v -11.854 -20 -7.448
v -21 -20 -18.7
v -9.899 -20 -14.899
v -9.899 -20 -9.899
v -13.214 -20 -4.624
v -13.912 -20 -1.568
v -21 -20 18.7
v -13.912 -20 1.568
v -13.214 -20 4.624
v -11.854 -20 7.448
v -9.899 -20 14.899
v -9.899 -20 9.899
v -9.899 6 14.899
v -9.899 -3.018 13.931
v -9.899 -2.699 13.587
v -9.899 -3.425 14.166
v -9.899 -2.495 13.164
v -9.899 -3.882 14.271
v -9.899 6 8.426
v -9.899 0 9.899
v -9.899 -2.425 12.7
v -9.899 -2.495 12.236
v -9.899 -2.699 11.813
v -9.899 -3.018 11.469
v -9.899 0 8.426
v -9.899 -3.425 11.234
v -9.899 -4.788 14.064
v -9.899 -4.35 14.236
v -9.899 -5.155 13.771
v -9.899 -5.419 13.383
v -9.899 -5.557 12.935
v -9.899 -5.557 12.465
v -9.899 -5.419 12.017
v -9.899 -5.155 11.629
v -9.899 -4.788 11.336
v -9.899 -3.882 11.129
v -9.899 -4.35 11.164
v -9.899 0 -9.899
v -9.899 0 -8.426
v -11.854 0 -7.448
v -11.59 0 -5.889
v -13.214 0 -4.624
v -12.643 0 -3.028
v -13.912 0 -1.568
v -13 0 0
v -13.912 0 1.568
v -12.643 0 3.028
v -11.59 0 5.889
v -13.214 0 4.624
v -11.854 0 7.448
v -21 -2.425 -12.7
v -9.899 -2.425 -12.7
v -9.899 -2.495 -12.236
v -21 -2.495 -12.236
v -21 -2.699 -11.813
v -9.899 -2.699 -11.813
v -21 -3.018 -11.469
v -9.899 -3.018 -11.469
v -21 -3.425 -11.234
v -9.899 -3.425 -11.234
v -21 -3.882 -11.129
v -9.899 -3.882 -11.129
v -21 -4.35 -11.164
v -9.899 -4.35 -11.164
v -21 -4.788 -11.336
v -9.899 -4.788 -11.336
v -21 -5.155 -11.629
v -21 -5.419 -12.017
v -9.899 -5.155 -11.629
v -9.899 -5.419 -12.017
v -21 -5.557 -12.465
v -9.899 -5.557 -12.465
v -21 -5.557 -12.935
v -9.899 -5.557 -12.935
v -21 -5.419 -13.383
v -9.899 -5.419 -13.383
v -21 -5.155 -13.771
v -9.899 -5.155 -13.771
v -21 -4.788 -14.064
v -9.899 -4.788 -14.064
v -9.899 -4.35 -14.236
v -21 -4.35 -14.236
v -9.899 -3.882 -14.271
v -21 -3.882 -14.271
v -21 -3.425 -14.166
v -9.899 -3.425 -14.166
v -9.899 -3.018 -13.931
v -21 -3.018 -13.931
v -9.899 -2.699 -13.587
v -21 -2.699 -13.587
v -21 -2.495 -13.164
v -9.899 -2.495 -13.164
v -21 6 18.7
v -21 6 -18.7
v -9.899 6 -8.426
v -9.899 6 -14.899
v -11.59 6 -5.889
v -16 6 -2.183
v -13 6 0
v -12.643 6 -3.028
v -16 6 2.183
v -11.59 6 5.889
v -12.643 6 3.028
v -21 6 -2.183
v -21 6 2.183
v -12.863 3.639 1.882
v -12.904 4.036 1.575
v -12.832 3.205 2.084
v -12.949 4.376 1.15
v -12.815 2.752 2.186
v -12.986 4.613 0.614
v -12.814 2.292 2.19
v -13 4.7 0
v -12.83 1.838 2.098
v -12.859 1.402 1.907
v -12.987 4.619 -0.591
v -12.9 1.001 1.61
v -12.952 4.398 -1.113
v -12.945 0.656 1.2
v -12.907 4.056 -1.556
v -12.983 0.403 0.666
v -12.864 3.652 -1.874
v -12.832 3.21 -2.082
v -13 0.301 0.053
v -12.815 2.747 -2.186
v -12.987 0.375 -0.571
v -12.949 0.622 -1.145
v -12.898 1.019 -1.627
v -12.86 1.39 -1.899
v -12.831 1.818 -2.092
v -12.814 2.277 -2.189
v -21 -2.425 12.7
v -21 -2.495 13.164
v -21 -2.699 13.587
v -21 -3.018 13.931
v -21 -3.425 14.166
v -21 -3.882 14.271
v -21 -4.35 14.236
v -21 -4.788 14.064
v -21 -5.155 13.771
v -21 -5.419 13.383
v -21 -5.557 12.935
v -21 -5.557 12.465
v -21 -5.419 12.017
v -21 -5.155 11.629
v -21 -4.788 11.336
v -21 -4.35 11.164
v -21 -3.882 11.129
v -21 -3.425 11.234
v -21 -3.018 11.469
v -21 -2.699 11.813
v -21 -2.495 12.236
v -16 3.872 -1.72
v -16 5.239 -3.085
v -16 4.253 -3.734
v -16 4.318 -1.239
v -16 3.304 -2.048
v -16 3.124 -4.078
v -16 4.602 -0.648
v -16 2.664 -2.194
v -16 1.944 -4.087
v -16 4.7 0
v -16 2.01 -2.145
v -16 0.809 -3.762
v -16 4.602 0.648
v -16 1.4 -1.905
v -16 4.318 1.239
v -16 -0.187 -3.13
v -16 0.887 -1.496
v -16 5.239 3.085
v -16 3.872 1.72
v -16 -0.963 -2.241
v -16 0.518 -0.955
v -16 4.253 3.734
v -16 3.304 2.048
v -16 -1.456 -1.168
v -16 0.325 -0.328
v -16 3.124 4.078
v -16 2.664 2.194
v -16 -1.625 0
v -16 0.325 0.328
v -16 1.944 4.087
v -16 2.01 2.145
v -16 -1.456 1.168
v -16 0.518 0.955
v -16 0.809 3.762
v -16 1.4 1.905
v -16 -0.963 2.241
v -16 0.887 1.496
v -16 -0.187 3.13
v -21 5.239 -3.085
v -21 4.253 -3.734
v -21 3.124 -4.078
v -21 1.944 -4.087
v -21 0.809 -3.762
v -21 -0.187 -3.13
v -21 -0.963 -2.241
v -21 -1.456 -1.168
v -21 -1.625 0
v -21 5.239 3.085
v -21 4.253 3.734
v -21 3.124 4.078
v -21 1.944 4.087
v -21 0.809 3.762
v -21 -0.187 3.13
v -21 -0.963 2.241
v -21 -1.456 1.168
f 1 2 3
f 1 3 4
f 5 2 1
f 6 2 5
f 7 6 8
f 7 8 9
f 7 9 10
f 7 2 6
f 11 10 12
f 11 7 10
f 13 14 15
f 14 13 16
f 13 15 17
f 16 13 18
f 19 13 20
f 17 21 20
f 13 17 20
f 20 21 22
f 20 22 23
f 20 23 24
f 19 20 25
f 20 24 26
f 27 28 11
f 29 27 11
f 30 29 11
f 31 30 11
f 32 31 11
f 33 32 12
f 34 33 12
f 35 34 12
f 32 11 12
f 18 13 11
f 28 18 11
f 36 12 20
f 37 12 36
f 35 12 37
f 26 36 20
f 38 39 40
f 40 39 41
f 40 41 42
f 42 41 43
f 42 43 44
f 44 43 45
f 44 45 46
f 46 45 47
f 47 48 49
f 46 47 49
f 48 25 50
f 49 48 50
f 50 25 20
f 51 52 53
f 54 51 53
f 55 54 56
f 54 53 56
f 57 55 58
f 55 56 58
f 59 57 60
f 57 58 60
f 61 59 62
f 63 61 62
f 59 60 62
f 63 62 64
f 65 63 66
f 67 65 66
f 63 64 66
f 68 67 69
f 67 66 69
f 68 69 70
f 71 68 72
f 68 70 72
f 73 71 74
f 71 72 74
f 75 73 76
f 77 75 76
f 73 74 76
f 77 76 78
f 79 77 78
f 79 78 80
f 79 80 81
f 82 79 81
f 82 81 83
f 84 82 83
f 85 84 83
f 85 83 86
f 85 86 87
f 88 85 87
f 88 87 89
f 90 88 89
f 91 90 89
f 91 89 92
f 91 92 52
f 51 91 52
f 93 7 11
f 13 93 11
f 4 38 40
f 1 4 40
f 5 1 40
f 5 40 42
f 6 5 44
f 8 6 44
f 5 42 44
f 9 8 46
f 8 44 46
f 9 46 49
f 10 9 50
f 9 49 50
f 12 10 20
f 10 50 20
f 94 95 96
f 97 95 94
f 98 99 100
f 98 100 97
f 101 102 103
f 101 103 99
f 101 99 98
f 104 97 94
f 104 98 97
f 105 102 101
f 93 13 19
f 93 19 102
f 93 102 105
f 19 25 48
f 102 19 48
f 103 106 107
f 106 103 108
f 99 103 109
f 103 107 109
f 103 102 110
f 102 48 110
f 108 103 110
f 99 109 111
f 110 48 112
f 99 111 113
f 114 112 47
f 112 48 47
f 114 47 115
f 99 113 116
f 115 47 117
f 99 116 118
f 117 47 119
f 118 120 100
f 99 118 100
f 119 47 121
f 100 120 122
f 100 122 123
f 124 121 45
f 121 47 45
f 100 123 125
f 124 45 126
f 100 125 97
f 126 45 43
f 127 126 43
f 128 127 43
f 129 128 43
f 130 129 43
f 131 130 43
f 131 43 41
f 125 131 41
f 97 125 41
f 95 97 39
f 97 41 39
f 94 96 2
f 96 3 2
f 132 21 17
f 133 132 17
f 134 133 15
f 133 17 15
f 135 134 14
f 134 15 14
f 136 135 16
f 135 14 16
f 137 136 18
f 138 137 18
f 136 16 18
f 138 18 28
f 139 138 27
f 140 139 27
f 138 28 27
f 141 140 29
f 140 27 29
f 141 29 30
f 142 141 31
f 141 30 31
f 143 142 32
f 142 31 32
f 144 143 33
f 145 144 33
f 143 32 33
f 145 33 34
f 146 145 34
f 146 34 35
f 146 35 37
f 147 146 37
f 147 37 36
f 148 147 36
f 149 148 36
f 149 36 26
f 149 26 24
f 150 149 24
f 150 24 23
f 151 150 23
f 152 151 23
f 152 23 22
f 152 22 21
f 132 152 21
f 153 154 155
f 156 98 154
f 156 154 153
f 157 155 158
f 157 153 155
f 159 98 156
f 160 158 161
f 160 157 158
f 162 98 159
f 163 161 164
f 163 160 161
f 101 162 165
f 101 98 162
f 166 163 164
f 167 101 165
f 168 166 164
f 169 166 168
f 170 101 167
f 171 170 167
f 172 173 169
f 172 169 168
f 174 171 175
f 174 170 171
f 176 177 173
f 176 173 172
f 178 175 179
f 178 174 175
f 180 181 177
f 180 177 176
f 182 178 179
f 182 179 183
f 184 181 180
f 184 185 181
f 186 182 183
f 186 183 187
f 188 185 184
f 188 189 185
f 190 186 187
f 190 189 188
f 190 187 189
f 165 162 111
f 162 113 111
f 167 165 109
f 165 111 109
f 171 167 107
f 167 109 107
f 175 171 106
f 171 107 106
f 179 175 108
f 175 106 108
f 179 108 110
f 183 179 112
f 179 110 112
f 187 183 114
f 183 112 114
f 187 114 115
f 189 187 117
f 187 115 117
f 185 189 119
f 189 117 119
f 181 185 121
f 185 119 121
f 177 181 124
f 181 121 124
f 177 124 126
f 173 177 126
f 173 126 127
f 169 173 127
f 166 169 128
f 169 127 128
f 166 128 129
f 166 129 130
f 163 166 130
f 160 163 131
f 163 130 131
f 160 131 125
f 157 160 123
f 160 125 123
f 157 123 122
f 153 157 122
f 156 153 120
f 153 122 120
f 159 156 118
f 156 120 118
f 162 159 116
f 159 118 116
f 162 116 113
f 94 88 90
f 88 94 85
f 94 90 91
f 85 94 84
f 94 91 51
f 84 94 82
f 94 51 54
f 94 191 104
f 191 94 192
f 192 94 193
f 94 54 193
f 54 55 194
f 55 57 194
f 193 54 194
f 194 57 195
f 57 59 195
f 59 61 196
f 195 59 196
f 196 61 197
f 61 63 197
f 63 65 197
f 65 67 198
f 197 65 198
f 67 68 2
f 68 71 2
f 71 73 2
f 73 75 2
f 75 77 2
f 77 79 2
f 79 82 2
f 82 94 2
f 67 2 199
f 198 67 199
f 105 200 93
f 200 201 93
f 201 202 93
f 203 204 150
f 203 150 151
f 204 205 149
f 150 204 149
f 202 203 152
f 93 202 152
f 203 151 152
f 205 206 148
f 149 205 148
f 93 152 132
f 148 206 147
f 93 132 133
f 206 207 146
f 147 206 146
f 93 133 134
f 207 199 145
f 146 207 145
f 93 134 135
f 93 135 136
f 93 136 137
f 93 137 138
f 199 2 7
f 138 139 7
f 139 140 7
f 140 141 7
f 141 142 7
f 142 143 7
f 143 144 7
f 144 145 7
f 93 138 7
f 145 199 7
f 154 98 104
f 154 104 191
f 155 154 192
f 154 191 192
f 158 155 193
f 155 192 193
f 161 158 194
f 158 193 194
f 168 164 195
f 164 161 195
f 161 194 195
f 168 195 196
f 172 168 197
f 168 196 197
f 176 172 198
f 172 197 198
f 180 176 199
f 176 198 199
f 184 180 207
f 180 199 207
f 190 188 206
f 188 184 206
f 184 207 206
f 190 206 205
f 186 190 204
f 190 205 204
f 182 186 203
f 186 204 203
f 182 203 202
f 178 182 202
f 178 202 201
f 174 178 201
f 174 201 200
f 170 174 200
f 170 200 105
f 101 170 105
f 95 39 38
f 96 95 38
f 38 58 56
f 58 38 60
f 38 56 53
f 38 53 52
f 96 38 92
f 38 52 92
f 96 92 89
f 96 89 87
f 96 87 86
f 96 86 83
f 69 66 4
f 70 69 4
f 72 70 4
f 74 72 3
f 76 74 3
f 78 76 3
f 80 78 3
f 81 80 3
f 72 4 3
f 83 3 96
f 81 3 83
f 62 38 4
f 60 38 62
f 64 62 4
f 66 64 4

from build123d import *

# Parameters (mm, degrees)
F2_DEPTH       = 20
F4_DEPTH       = 6
F6_D           = 3.15
F7_D           = 4.4
F7_CBORE_D     = 8.25
F7_CBORE_DEPTH = 5


with BuildPart() as f2:
    # F1 (on Front) → F2 (new body)
    with BuildSketch(Plane.XZ):
        with BuildLine():
            ThreePointArc((-9.8994949366, -9.8994949366), (-14, 0), (-9.8994949366, 9.8994949366))
            Line((-9.8994949366, 9.8994949366), (-9.8994949366, 14.8994949366))
            Line((-9.8994949366, 14.8994949366), (-21, 18.7))
            Line((-21, 18.7), (-21, -18.7))
            Line((-21, -18.7), (-9.8994949366, -14.8994949366))
            Line((-9.8994949366, -14.8994949366), (-9.8994949366, -9.8994949366))
        make_face()
    extrude(amount=F2_DEPTH)

    # F3 (on face) → F4 (join)
    with BuildSketch(Plane(origin=(0, 0, 0), x_dir=(-1, 0, 0), z_dir=(0, 1, 0))):
        with BuildLine():
            Line((9.8994949366, 14.8994949366), (9.8994949366, 8.4261497732))
            ThreePointArc((9.8994949366, 8.4261497732), (13, 0), (9.8994949366, -8.4261497732))
            Line((9.8994949366, -8.4261497732), (9.8994949366, -14.8994949366))
            Line((9.8994949366, -14.8994949366), (21, -18.7))
            Line((21, -18.7), (21, 18.7))
            Line((21, 18.7), (9.8994949366, 14.8994949366))
        make_face()
    extrude(amount=F4_DEPTH)

    # F6 (through all)
    with Locations(Plane(origin=(-21, 0, 0), x_dir=(0, -1, 0), z_dir=(-1, 0, 0))):
        with Locations((4, 12.7), (4, -12.7)):
            Hole(F6_D / 2)

    # F7 (through all)
    with Locations(Plane(origin=(-21, 0, 0), x_dir=(0, -1, 0), z_dir=(-1, 0, 0))):
        with Locations((-2.5, 0)):
            CounterBoreHole(F7_D / 2, F7_CBORE_D / 2, F7_CBORE_DEPTH)


solid = f2.part
